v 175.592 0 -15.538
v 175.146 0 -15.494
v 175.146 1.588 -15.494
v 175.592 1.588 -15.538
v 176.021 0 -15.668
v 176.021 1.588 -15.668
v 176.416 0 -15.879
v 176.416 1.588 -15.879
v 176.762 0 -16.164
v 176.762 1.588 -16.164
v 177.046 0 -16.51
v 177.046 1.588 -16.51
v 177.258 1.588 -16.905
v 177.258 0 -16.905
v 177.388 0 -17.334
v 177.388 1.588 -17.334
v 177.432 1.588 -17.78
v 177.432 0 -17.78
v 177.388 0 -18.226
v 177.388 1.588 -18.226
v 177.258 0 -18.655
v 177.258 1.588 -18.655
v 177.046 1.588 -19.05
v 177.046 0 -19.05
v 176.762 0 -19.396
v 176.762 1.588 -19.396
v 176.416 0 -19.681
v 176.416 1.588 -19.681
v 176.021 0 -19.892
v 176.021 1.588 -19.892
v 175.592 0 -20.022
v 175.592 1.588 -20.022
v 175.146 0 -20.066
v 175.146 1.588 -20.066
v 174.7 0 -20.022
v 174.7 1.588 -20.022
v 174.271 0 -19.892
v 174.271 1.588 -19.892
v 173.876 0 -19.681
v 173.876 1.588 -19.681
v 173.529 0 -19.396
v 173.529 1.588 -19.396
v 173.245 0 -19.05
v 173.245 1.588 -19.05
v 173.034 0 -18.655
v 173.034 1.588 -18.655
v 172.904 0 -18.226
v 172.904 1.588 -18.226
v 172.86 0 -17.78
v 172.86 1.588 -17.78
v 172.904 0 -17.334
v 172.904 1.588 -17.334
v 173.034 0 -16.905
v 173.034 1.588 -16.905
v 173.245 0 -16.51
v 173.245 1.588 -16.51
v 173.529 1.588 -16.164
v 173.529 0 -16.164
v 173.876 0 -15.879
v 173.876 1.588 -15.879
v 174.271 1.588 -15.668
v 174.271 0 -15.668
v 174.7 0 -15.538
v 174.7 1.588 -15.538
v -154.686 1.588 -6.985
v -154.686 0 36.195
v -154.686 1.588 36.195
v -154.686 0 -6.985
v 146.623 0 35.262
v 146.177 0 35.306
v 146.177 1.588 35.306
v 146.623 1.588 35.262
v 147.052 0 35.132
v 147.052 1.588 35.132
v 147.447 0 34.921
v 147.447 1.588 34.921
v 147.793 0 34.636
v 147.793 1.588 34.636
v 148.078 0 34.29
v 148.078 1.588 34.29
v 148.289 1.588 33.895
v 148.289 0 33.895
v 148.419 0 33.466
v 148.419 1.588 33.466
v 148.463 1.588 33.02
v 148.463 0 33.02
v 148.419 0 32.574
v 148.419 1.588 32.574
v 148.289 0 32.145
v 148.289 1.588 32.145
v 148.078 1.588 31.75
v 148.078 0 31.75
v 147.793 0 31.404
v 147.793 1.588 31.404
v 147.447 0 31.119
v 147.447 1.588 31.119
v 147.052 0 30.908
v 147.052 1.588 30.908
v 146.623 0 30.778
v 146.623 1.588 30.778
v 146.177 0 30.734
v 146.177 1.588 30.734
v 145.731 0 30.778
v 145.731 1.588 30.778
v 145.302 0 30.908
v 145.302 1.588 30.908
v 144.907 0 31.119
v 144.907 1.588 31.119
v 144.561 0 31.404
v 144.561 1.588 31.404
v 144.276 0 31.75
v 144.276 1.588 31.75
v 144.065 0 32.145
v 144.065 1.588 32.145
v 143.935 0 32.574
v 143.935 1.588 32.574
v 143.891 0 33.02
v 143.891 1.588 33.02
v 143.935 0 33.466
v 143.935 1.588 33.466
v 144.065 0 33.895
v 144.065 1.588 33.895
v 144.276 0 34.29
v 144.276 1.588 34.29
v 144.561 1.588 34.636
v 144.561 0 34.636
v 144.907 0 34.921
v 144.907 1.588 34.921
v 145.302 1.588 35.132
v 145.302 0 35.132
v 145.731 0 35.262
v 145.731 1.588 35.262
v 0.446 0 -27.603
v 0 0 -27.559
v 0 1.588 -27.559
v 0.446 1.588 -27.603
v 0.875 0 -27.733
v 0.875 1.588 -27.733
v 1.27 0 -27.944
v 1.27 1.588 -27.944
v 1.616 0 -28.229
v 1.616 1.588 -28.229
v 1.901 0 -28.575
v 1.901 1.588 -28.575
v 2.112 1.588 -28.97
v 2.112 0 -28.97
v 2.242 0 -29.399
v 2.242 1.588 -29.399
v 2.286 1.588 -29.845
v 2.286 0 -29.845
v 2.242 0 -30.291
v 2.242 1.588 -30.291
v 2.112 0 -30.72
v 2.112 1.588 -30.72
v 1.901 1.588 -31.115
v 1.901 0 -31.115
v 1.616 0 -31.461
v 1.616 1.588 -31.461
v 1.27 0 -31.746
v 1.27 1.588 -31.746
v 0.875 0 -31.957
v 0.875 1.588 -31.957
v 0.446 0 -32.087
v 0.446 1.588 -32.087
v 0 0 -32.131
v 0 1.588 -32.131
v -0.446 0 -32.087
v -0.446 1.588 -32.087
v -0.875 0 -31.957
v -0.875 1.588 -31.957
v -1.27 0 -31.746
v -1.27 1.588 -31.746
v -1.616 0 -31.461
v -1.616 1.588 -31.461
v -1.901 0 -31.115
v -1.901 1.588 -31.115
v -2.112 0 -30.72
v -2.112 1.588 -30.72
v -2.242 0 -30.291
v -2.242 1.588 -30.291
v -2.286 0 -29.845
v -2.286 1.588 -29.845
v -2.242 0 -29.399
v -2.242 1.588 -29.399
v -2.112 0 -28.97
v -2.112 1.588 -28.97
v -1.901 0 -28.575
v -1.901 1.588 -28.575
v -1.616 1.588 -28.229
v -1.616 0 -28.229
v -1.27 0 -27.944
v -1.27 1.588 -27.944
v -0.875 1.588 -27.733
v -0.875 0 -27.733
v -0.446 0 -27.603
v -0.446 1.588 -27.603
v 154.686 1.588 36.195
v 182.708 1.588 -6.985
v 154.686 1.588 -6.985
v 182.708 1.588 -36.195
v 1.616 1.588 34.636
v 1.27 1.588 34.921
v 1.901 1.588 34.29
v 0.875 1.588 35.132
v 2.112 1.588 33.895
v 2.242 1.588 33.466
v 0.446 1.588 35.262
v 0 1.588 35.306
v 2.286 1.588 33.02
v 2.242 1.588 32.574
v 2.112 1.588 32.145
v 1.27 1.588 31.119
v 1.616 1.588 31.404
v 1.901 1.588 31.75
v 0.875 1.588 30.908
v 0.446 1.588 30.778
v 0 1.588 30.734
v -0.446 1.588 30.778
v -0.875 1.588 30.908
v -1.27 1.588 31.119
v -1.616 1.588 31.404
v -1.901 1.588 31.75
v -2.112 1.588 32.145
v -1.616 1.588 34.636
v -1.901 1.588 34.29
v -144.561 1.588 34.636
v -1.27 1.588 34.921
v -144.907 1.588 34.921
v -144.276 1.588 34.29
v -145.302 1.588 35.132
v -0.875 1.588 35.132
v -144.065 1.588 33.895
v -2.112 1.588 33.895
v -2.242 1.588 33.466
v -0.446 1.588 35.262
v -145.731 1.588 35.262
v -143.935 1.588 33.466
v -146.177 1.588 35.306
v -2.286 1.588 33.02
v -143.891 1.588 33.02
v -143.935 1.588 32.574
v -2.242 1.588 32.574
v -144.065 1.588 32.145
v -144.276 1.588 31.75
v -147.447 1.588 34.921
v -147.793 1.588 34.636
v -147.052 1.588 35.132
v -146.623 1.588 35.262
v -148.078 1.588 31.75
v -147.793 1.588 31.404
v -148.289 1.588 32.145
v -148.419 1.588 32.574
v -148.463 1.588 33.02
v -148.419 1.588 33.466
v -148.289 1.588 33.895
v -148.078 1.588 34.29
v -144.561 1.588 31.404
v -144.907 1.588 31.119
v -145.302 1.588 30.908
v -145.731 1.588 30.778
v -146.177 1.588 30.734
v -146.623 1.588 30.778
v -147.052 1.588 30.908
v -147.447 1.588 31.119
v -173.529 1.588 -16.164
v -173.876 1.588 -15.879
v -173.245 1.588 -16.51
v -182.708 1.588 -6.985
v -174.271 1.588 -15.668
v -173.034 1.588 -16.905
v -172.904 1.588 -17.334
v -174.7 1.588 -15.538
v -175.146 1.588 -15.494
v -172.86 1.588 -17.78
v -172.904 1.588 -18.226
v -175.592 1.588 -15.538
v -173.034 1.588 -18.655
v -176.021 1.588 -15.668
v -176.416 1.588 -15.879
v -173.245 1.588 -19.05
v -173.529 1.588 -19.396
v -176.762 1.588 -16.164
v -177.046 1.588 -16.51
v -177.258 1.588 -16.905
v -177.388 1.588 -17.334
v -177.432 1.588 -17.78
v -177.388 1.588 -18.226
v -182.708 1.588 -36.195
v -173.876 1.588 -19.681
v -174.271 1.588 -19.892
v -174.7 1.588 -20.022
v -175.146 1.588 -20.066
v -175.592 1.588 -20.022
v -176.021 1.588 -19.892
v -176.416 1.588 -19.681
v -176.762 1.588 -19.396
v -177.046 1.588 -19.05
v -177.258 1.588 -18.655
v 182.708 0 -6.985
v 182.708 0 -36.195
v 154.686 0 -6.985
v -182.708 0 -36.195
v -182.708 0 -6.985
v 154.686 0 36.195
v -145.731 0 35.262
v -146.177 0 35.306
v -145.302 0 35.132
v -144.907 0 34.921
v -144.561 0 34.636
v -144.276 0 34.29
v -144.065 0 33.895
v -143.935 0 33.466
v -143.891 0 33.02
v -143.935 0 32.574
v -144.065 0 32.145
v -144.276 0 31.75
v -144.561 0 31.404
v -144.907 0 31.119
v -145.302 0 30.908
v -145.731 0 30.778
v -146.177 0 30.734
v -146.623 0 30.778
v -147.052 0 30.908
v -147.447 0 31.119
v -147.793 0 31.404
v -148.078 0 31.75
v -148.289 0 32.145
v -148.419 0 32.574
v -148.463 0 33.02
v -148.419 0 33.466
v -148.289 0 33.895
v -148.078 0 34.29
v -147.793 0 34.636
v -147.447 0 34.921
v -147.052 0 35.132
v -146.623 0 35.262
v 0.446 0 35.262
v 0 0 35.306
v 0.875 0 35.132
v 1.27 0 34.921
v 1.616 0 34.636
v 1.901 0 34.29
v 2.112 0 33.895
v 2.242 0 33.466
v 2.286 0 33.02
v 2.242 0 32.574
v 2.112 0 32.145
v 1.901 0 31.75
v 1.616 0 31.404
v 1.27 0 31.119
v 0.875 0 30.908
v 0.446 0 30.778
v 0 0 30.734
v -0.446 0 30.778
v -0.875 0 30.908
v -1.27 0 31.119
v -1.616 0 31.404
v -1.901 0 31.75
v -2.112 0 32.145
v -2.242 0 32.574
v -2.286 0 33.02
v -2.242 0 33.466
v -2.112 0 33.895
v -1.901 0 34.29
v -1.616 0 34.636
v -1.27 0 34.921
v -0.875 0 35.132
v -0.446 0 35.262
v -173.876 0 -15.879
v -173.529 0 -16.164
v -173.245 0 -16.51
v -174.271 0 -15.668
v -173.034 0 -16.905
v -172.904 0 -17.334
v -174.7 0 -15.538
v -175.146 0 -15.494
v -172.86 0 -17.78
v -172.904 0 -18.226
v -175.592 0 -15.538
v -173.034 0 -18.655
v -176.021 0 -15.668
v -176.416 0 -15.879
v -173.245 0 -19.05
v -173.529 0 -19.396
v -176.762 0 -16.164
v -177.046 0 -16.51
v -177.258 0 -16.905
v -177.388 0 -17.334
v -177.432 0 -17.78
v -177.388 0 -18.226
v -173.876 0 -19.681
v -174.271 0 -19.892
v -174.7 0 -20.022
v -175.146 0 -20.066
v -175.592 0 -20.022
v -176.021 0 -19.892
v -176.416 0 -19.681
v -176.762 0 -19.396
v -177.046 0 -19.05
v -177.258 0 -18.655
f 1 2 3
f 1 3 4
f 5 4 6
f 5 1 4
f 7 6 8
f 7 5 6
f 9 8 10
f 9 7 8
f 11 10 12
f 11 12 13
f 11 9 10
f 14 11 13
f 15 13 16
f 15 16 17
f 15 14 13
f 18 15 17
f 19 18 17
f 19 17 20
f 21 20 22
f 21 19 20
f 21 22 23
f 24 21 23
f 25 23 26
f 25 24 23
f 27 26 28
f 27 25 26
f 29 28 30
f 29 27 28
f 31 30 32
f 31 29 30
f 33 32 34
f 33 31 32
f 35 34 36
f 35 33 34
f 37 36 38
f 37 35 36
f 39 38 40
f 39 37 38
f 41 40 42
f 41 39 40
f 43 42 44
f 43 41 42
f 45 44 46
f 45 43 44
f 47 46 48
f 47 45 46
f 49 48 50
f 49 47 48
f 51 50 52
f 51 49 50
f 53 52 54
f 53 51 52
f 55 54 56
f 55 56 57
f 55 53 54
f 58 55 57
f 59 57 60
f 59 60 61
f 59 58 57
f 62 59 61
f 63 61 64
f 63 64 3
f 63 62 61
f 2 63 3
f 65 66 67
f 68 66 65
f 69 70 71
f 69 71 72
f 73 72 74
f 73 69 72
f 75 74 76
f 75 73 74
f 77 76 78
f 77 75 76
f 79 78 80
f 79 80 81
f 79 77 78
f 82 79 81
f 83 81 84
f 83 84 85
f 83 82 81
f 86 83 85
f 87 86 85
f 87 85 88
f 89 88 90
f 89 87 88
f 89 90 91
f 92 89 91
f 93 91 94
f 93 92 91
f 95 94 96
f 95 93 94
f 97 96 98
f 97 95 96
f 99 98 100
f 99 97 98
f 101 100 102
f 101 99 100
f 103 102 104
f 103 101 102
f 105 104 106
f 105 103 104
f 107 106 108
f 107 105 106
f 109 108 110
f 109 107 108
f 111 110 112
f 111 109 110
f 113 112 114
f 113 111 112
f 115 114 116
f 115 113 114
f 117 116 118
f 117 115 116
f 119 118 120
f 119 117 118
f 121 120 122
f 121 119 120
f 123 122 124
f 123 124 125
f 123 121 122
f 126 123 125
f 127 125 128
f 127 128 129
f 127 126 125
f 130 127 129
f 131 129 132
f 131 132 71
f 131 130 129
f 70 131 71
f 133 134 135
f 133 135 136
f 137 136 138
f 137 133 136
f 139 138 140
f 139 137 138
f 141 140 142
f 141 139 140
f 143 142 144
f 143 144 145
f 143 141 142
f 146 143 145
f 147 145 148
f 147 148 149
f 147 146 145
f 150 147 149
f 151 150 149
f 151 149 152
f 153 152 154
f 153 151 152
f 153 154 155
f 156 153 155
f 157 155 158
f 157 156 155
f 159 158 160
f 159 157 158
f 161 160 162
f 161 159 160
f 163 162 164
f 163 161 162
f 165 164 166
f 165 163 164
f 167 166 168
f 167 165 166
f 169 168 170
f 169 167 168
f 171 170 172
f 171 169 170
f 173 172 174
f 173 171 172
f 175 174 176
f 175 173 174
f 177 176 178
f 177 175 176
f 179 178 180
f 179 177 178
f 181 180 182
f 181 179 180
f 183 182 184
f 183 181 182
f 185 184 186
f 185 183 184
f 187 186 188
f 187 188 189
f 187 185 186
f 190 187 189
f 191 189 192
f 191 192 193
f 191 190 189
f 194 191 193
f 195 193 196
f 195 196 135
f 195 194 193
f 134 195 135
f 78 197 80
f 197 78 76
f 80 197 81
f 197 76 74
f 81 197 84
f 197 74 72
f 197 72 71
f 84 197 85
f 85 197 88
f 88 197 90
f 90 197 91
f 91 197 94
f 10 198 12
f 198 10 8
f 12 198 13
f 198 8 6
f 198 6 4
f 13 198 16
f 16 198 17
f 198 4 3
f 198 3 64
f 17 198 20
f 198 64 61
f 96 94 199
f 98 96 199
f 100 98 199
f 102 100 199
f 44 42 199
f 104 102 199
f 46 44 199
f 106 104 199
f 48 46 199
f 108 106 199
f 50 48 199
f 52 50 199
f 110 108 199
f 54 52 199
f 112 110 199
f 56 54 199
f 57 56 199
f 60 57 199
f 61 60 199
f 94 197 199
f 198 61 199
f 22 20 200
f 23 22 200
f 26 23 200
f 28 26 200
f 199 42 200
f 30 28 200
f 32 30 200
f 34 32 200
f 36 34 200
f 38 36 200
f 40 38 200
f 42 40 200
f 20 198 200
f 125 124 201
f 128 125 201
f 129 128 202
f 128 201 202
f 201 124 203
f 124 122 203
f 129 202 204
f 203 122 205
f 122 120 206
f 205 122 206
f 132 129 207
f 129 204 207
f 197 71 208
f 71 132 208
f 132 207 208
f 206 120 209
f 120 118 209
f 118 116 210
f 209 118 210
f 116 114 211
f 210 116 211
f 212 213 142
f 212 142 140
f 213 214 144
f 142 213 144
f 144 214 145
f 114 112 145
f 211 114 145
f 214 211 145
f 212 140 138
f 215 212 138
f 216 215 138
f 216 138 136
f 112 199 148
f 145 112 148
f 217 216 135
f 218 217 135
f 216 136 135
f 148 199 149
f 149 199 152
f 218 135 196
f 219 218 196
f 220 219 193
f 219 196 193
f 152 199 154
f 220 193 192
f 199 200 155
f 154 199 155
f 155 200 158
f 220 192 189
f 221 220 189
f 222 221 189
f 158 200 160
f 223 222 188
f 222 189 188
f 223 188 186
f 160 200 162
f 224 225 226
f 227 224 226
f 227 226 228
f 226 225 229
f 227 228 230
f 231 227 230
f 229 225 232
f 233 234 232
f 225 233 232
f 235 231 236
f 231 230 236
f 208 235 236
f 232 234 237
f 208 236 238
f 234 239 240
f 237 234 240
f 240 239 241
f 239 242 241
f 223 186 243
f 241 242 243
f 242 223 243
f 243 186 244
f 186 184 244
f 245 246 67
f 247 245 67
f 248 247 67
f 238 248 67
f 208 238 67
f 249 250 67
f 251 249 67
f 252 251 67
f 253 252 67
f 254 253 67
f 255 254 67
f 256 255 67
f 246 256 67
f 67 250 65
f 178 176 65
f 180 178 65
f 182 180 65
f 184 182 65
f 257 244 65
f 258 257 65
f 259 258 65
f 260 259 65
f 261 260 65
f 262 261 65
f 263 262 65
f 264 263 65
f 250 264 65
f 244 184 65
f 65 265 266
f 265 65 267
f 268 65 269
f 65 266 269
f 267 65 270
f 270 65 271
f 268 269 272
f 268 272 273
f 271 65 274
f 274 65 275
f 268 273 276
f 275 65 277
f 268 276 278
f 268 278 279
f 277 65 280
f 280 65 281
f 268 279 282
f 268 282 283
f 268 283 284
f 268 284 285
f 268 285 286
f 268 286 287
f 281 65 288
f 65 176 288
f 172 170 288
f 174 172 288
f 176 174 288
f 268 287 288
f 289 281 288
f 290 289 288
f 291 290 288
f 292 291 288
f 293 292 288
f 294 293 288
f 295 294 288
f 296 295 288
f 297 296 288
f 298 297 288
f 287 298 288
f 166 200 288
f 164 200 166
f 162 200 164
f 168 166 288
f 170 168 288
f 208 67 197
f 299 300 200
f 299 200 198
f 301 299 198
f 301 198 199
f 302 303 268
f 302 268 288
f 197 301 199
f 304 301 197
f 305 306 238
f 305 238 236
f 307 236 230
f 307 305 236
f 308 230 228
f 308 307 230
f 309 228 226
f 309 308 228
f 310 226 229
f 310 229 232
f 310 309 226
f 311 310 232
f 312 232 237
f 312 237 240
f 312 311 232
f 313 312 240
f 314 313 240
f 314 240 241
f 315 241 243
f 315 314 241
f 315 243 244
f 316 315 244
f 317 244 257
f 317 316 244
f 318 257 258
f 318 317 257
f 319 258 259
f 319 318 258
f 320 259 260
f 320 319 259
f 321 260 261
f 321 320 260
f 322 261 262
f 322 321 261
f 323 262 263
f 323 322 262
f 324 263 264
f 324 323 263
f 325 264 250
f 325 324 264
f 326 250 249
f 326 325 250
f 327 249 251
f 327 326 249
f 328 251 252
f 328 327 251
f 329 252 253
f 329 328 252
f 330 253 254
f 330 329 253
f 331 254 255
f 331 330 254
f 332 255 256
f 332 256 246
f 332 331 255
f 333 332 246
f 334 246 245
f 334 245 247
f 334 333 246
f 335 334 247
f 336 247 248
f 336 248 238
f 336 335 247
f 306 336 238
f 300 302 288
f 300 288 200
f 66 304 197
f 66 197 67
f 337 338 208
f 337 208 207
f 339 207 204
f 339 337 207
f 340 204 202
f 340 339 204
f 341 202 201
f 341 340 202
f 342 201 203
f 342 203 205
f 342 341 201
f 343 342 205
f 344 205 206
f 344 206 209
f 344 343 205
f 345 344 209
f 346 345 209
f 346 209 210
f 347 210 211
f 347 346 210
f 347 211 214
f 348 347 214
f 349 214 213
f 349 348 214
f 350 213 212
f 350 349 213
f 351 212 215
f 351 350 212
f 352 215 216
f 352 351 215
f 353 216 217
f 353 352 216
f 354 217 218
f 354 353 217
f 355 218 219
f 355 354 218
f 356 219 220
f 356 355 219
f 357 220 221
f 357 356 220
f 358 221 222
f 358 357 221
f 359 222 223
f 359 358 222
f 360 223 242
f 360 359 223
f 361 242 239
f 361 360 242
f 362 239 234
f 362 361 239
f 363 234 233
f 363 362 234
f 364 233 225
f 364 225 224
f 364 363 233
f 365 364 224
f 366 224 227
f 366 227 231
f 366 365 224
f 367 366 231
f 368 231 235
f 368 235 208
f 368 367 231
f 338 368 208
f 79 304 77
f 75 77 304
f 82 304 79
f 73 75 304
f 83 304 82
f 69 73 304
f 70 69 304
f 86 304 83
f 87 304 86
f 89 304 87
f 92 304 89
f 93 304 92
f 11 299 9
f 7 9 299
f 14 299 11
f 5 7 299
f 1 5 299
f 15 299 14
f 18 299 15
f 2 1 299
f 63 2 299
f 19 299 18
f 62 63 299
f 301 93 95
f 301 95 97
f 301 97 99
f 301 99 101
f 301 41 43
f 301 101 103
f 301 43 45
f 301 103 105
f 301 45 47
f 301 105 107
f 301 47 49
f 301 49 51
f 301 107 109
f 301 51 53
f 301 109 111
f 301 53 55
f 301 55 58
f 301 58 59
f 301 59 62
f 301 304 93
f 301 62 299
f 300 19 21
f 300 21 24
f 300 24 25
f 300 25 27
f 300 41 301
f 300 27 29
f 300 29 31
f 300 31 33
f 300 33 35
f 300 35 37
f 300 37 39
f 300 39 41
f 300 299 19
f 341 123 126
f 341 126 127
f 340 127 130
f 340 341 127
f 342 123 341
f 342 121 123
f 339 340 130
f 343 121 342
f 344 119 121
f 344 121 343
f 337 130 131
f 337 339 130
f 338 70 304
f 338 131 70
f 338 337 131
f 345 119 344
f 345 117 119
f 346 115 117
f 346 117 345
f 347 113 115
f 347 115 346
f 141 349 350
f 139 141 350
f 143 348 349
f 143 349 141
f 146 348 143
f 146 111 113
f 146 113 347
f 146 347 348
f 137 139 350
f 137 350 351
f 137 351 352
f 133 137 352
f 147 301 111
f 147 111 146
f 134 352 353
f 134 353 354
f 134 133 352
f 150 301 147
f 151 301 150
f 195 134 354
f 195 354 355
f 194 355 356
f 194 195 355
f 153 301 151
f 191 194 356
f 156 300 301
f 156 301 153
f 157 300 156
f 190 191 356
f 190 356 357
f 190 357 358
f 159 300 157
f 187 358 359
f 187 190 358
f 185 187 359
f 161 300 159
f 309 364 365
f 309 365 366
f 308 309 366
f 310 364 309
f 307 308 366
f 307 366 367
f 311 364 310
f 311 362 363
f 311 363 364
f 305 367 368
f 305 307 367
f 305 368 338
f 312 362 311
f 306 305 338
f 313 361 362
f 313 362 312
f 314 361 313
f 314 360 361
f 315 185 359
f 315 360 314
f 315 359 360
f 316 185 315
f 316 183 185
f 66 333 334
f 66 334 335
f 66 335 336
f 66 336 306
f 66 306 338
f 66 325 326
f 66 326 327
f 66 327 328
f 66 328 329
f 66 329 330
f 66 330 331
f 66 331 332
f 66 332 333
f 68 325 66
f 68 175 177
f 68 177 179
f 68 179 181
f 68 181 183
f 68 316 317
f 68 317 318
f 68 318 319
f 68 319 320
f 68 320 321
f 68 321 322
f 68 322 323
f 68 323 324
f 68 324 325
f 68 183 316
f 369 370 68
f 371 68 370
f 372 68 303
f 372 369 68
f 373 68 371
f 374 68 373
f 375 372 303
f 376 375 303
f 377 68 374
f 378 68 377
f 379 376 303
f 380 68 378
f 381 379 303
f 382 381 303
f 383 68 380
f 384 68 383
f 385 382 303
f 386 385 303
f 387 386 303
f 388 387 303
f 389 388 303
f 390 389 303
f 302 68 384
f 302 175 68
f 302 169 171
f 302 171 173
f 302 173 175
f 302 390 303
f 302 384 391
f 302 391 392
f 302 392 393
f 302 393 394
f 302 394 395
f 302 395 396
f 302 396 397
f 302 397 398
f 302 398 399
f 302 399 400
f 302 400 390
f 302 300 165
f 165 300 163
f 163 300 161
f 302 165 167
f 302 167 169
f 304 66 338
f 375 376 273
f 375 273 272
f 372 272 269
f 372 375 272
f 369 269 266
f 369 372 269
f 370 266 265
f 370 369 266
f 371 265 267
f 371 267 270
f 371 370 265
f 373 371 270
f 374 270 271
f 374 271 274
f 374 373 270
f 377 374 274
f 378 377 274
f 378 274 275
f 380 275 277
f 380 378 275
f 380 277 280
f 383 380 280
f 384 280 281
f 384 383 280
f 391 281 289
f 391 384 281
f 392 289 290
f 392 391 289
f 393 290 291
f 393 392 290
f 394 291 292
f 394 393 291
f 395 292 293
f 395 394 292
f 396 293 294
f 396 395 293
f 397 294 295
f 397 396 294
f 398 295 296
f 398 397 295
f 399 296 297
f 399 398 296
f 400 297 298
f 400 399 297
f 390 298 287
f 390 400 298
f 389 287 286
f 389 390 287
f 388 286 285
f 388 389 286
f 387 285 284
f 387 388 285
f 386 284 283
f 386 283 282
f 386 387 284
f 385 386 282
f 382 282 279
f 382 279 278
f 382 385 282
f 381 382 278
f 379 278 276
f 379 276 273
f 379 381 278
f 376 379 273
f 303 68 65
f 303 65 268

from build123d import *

# Parameters (mm, degrees)
SKETCH1_R           = 2.286
BOSS_EXTRUDE1_DEPTH = 1.5875


with BuildPart() as part:
    # Sketch1 → Boss-Extrude1 (new body)
    with BuildSketch(Plane(origin=(0, 0, 0), x_dir=(1, 0, 0), z_dir=(0, 1, 0))):
        Polygon((-154.686, -36.195), (-154.686, 6.985), (-182.708271591, 6.985), (-182.708271591, 36.195), (182.708271591, 36.195), (182.708271591, 6.985), (154.686, 6.985), (154.686, -36.195), align=None)
        with Locations(Location((175.1457, 17.78, 0), (0, 0, 270))):
            Circle(SKETCH1_R, mode=Mode.SUBTRACT)
        with Locations(Location((0, 29.845, 0), (0, 0, 270))):
            Circle(SKETCH1_R, mode=Mode.SUBTRACT)
        with Locations(Location((146.177, -33.02, 0), (0, 0, 270))):
            Circle(SKETCH1_R, mode=Mode.SUBTRACT)
        with Locations(Location((-175.1457, 17.78, 0), (0, 0, 270))):
            Circle(SKETCH1_R, mode=Mode.SUBTRACT)
        with Locations(Location((0, -33.02, 0), (0, 0, 270))):
            Circle(SKETCH1_R, mode=Mode.SUBTRACT)
        with Locations(Location((-146.177, -33.02, 0), (0, 0, 270))):
            Circle(SKETCH1_R, mode=Mode.SUBTRACT)
    extrude(amount=BOSS_EXTRUDE1_DEPTH)


solid = part.part
